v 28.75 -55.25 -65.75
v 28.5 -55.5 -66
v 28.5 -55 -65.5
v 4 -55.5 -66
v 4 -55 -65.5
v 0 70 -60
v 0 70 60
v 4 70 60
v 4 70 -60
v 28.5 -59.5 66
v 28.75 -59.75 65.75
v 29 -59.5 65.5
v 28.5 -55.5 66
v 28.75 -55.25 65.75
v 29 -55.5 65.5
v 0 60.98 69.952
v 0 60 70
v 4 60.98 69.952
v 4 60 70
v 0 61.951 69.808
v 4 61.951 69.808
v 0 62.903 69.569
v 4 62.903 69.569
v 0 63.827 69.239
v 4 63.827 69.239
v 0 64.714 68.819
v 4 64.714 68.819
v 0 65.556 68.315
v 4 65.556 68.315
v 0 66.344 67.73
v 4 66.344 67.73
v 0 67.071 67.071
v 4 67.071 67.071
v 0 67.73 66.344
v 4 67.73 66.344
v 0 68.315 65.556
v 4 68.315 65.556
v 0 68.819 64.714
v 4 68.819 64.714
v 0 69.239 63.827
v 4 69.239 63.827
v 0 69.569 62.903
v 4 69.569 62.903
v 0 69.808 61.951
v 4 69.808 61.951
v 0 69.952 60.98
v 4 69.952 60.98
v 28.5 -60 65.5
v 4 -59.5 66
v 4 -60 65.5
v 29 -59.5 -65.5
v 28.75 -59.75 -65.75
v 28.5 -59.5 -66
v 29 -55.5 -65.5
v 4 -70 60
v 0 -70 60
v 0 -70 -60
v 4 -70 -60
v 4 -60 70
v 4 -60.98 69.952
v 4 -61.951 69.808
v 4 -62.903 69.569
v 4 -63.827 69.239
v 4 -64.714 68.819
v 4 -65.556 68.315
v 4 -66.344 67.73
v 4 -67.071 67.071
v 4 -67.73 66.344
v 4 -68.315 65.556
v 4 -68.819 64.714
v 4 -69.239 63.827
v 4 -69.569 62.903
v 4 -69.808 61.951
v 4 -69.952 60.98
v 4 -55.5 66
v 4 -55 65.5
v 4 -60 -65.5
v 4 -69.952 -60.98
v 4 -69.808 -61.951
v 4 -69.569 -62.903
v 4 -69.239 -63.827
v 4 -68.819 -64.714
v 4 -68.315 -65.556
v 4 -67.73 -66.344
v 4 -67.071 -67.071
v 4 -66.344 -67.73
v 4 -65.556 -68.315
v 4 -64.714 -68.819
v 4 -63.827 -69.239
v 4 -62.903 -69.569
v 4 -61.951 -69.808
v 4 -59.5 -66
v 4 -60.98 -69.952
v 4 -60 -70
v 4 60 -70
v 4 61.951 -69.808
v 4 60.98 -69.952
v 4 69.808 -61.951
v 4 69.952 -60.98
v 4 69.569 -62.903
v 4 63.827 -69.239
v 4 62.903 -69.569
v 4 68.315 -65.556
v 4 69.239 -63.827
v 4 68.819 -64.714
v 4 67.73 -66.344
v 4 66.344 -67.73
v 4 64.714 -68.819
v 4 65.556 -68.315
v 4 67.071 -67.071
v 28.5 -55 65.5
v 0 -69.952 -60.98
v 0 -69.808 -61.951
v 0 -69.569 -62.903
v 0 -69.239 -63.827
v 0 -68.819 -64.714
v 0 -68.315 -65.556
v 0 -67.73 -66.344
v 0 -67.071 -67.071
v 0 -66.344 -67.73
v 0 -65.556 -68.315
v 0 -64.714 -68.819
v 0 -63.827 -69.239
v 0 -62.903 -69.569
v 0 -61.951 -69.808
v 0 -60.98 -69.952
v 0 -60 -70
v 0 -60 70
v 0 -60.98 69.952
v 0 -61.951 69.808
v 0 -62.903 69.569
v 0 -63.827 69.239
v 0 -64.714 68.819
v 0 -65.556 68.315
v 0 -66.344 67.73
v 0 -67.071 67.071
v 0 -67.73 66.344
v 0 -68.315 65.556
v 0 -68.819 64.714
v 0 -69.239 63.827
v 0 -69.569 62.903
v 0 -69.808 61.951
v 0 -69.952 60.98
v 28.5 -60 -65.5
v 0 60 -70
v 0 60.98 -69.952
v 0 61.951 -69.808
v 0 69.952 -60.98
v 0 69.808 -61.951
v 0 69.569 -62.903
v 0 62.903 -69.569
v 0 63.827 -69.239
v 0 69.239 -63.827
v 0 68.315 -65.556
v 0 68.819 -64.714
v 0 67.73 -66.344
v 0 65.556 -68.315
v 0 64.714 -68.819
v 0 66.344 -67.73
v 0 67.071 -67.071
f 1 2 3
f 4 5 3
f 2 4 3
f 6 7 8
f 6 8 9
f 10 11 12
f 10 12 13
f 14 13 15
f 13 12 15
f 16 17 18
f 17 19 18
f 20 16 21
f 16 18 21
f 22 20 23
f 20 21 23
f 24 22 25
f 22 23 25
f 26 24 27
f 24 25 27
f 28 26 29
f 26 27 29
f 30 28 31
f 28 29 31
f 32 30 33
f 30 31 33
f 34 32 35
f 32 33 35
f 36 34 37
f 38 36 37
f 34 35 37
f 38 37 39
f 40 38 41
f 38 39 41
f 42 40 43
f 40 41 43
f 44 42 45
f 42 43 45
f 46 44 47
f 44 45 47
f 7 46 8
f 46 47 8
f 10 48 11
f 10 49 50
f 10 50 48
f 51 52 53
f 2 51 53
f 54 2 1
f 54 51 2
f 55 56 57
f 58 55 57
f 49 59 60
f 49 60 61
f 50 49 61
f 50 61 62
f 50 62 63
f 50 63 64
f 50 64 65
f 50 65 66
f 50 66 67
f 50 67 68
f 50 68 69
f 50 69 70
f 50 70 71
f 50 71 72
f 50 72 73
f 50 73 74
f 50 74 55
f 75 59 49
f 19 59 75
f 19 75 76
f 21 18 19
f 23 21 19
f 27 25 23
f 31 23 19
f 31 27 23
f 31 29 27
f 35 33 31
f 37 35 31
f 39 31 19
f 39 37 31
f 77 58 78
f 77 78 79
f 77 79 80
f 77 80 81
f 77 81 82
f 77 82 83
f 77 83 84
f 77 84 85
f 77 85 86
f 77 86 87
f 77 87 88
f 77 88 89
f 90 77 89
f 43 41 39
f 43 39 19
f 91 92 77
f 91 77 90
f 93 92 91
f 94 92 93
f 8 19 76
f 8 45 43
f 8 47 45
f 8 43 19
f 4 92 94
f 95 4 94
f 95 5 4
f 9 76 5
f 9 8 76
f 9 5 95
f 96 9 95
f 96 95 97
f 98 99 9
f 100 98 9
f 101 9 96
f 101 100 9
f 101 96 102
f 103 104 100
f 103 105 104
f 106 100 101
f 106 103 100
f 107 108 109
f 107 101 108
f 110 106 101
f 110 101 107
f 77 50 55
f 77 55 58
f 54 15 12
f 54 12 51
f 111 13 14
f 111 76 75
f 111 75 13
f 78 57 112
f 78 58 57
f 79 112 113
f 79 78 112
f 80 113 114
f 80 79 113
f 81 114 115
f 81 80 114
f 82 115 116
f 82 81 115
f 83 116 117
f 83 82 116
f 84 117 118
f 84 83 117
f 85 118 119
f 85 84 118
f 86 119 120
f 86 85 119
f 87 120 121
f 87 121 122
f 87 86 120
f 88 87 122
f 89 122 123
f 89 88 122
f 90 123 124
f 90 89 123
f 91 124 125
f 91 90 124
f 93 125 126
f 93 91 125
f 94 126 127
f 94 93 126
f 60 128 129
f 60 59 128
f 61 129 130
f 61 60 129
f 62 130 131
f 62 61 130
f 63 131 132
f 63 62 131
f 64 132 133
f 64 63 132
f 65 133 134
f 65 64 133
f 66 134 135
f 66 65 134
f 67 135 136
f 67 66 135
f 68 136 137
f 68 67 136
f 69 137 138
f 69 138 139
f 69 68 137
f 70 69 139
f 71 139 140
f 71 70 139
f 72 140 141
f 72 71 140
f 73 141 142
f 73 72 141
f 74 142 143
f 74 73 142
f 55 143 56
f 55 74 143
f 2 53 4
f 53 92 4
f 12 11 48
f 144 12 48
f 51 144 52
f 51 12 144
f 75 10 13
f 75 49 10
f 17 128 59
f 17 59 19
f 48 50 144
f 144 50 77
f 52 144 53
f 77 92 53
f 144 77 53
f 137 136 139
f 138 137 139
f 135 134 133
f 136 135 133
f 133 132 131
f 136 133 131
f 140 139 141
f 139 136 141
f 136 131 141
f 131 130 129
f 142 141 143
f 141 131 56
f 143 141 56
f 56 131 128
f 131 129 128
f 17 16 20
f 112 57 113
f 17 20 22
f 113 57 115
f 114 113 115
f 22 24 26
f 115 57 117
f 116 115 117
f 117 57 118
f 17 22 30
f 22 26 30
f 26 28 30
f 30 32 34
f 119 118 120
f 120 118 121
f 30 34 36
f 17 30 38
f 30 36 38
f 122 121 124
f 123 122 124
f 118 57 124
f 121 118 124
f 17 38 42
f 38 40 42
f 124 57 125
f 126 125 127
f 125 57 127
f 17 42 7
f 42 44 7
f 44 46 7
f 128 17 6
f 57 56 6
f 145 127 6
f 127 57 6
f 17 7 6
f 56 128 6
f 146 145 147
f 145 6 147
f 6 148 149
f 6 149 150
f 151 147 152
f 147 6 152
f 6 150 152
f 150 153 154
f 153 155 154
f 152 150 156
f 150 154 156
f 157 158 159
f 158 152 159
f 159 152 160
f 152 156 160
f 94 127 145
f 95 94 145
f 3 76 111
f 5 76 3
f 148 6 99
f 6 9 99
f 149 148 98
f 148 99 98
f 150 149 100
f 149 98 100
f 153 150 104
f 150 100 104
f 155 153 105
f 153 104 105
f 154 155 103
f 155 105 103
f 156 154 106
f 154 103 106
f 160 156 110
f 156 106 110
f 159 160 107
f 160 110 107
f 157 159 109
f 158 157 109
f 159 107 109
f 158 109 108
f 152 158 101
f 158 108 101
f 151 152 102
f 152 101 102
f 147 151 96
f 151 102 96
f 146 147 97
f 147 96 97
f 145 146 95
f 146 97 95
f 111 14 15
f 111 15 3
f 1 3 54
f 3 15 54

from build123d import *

# Parameters (mm, degrees)
SKETCH_1_W      = 140
SKETCH_1_H      = 140
EXTRUDE_1_DEPTH = 4
SKETCH_3_W      = 132
SKETCH_3_H      = 5
EXTRUDE_2_DEPTH = 25
CHAMFER_1_SIZE  = 0.5
CHAMFER_2_SIZE  = 0.5
FILLET_1_R      = 10


with BuildPart() as part:
    # 草图1 → 凸台-拉伸1 (new body)
    with BuildSketch(Plane(origin=(0, 0, 0), x_dir=(0, 0, -1), z_dir=(1, 0, 0))):
        Rectangle(SKETCH_1_W, SKETCH_1_H)
    extrude(amount=EXTRUDE_1_DEPTH)

    # 草图3 → 凸台-拉伸2 (add)
    with BuildSketch(Plane(origin=(4, 0, 0), x_dir=(0, 0, -1), z_dir=(1, 0, 0))):
        with Locations((0, -57.5)):
            Rectangle(SKETCH_3_W, SKETCH_3_H)
    extrude(amount=EXTRUDE_2_DEPTH)

    # 倒角1
    chamfer_1_edges = [part.edges().sort_by_distance(p)[0] for p in [
        (29, -57.5, 66),
        (29, -60, 0),
        (29, -57.5, -66),
        (29, -55, 0),
    ]]
    chamfer(chamfer_1_edges, length=CHAMFER_1_SIZE)

    # 倒角2
    chamfer_2_edges = [part.edges().sort_by_distance(p)[0] for p in [
        (16.25, -55, 66),
        (16.25, -55, -66),
        (16.25, -60, -66),
        (16.25, -60, 66),
    ]]
    chamfer(chamfer_2_edges, length=CHAMFER_2_SIZE)

    # 圆角1
    fillet_1_edges = [part.edges().sort_by_distance(p)[0] for p in [
        (2, 70, 70),
        (2, 70, -70),
        (2, -70, -70),
        (2, -70, 70),
    ]]
    fillet(fillet_1_edges, radius=FILLET_1_R)


solid = part.part
